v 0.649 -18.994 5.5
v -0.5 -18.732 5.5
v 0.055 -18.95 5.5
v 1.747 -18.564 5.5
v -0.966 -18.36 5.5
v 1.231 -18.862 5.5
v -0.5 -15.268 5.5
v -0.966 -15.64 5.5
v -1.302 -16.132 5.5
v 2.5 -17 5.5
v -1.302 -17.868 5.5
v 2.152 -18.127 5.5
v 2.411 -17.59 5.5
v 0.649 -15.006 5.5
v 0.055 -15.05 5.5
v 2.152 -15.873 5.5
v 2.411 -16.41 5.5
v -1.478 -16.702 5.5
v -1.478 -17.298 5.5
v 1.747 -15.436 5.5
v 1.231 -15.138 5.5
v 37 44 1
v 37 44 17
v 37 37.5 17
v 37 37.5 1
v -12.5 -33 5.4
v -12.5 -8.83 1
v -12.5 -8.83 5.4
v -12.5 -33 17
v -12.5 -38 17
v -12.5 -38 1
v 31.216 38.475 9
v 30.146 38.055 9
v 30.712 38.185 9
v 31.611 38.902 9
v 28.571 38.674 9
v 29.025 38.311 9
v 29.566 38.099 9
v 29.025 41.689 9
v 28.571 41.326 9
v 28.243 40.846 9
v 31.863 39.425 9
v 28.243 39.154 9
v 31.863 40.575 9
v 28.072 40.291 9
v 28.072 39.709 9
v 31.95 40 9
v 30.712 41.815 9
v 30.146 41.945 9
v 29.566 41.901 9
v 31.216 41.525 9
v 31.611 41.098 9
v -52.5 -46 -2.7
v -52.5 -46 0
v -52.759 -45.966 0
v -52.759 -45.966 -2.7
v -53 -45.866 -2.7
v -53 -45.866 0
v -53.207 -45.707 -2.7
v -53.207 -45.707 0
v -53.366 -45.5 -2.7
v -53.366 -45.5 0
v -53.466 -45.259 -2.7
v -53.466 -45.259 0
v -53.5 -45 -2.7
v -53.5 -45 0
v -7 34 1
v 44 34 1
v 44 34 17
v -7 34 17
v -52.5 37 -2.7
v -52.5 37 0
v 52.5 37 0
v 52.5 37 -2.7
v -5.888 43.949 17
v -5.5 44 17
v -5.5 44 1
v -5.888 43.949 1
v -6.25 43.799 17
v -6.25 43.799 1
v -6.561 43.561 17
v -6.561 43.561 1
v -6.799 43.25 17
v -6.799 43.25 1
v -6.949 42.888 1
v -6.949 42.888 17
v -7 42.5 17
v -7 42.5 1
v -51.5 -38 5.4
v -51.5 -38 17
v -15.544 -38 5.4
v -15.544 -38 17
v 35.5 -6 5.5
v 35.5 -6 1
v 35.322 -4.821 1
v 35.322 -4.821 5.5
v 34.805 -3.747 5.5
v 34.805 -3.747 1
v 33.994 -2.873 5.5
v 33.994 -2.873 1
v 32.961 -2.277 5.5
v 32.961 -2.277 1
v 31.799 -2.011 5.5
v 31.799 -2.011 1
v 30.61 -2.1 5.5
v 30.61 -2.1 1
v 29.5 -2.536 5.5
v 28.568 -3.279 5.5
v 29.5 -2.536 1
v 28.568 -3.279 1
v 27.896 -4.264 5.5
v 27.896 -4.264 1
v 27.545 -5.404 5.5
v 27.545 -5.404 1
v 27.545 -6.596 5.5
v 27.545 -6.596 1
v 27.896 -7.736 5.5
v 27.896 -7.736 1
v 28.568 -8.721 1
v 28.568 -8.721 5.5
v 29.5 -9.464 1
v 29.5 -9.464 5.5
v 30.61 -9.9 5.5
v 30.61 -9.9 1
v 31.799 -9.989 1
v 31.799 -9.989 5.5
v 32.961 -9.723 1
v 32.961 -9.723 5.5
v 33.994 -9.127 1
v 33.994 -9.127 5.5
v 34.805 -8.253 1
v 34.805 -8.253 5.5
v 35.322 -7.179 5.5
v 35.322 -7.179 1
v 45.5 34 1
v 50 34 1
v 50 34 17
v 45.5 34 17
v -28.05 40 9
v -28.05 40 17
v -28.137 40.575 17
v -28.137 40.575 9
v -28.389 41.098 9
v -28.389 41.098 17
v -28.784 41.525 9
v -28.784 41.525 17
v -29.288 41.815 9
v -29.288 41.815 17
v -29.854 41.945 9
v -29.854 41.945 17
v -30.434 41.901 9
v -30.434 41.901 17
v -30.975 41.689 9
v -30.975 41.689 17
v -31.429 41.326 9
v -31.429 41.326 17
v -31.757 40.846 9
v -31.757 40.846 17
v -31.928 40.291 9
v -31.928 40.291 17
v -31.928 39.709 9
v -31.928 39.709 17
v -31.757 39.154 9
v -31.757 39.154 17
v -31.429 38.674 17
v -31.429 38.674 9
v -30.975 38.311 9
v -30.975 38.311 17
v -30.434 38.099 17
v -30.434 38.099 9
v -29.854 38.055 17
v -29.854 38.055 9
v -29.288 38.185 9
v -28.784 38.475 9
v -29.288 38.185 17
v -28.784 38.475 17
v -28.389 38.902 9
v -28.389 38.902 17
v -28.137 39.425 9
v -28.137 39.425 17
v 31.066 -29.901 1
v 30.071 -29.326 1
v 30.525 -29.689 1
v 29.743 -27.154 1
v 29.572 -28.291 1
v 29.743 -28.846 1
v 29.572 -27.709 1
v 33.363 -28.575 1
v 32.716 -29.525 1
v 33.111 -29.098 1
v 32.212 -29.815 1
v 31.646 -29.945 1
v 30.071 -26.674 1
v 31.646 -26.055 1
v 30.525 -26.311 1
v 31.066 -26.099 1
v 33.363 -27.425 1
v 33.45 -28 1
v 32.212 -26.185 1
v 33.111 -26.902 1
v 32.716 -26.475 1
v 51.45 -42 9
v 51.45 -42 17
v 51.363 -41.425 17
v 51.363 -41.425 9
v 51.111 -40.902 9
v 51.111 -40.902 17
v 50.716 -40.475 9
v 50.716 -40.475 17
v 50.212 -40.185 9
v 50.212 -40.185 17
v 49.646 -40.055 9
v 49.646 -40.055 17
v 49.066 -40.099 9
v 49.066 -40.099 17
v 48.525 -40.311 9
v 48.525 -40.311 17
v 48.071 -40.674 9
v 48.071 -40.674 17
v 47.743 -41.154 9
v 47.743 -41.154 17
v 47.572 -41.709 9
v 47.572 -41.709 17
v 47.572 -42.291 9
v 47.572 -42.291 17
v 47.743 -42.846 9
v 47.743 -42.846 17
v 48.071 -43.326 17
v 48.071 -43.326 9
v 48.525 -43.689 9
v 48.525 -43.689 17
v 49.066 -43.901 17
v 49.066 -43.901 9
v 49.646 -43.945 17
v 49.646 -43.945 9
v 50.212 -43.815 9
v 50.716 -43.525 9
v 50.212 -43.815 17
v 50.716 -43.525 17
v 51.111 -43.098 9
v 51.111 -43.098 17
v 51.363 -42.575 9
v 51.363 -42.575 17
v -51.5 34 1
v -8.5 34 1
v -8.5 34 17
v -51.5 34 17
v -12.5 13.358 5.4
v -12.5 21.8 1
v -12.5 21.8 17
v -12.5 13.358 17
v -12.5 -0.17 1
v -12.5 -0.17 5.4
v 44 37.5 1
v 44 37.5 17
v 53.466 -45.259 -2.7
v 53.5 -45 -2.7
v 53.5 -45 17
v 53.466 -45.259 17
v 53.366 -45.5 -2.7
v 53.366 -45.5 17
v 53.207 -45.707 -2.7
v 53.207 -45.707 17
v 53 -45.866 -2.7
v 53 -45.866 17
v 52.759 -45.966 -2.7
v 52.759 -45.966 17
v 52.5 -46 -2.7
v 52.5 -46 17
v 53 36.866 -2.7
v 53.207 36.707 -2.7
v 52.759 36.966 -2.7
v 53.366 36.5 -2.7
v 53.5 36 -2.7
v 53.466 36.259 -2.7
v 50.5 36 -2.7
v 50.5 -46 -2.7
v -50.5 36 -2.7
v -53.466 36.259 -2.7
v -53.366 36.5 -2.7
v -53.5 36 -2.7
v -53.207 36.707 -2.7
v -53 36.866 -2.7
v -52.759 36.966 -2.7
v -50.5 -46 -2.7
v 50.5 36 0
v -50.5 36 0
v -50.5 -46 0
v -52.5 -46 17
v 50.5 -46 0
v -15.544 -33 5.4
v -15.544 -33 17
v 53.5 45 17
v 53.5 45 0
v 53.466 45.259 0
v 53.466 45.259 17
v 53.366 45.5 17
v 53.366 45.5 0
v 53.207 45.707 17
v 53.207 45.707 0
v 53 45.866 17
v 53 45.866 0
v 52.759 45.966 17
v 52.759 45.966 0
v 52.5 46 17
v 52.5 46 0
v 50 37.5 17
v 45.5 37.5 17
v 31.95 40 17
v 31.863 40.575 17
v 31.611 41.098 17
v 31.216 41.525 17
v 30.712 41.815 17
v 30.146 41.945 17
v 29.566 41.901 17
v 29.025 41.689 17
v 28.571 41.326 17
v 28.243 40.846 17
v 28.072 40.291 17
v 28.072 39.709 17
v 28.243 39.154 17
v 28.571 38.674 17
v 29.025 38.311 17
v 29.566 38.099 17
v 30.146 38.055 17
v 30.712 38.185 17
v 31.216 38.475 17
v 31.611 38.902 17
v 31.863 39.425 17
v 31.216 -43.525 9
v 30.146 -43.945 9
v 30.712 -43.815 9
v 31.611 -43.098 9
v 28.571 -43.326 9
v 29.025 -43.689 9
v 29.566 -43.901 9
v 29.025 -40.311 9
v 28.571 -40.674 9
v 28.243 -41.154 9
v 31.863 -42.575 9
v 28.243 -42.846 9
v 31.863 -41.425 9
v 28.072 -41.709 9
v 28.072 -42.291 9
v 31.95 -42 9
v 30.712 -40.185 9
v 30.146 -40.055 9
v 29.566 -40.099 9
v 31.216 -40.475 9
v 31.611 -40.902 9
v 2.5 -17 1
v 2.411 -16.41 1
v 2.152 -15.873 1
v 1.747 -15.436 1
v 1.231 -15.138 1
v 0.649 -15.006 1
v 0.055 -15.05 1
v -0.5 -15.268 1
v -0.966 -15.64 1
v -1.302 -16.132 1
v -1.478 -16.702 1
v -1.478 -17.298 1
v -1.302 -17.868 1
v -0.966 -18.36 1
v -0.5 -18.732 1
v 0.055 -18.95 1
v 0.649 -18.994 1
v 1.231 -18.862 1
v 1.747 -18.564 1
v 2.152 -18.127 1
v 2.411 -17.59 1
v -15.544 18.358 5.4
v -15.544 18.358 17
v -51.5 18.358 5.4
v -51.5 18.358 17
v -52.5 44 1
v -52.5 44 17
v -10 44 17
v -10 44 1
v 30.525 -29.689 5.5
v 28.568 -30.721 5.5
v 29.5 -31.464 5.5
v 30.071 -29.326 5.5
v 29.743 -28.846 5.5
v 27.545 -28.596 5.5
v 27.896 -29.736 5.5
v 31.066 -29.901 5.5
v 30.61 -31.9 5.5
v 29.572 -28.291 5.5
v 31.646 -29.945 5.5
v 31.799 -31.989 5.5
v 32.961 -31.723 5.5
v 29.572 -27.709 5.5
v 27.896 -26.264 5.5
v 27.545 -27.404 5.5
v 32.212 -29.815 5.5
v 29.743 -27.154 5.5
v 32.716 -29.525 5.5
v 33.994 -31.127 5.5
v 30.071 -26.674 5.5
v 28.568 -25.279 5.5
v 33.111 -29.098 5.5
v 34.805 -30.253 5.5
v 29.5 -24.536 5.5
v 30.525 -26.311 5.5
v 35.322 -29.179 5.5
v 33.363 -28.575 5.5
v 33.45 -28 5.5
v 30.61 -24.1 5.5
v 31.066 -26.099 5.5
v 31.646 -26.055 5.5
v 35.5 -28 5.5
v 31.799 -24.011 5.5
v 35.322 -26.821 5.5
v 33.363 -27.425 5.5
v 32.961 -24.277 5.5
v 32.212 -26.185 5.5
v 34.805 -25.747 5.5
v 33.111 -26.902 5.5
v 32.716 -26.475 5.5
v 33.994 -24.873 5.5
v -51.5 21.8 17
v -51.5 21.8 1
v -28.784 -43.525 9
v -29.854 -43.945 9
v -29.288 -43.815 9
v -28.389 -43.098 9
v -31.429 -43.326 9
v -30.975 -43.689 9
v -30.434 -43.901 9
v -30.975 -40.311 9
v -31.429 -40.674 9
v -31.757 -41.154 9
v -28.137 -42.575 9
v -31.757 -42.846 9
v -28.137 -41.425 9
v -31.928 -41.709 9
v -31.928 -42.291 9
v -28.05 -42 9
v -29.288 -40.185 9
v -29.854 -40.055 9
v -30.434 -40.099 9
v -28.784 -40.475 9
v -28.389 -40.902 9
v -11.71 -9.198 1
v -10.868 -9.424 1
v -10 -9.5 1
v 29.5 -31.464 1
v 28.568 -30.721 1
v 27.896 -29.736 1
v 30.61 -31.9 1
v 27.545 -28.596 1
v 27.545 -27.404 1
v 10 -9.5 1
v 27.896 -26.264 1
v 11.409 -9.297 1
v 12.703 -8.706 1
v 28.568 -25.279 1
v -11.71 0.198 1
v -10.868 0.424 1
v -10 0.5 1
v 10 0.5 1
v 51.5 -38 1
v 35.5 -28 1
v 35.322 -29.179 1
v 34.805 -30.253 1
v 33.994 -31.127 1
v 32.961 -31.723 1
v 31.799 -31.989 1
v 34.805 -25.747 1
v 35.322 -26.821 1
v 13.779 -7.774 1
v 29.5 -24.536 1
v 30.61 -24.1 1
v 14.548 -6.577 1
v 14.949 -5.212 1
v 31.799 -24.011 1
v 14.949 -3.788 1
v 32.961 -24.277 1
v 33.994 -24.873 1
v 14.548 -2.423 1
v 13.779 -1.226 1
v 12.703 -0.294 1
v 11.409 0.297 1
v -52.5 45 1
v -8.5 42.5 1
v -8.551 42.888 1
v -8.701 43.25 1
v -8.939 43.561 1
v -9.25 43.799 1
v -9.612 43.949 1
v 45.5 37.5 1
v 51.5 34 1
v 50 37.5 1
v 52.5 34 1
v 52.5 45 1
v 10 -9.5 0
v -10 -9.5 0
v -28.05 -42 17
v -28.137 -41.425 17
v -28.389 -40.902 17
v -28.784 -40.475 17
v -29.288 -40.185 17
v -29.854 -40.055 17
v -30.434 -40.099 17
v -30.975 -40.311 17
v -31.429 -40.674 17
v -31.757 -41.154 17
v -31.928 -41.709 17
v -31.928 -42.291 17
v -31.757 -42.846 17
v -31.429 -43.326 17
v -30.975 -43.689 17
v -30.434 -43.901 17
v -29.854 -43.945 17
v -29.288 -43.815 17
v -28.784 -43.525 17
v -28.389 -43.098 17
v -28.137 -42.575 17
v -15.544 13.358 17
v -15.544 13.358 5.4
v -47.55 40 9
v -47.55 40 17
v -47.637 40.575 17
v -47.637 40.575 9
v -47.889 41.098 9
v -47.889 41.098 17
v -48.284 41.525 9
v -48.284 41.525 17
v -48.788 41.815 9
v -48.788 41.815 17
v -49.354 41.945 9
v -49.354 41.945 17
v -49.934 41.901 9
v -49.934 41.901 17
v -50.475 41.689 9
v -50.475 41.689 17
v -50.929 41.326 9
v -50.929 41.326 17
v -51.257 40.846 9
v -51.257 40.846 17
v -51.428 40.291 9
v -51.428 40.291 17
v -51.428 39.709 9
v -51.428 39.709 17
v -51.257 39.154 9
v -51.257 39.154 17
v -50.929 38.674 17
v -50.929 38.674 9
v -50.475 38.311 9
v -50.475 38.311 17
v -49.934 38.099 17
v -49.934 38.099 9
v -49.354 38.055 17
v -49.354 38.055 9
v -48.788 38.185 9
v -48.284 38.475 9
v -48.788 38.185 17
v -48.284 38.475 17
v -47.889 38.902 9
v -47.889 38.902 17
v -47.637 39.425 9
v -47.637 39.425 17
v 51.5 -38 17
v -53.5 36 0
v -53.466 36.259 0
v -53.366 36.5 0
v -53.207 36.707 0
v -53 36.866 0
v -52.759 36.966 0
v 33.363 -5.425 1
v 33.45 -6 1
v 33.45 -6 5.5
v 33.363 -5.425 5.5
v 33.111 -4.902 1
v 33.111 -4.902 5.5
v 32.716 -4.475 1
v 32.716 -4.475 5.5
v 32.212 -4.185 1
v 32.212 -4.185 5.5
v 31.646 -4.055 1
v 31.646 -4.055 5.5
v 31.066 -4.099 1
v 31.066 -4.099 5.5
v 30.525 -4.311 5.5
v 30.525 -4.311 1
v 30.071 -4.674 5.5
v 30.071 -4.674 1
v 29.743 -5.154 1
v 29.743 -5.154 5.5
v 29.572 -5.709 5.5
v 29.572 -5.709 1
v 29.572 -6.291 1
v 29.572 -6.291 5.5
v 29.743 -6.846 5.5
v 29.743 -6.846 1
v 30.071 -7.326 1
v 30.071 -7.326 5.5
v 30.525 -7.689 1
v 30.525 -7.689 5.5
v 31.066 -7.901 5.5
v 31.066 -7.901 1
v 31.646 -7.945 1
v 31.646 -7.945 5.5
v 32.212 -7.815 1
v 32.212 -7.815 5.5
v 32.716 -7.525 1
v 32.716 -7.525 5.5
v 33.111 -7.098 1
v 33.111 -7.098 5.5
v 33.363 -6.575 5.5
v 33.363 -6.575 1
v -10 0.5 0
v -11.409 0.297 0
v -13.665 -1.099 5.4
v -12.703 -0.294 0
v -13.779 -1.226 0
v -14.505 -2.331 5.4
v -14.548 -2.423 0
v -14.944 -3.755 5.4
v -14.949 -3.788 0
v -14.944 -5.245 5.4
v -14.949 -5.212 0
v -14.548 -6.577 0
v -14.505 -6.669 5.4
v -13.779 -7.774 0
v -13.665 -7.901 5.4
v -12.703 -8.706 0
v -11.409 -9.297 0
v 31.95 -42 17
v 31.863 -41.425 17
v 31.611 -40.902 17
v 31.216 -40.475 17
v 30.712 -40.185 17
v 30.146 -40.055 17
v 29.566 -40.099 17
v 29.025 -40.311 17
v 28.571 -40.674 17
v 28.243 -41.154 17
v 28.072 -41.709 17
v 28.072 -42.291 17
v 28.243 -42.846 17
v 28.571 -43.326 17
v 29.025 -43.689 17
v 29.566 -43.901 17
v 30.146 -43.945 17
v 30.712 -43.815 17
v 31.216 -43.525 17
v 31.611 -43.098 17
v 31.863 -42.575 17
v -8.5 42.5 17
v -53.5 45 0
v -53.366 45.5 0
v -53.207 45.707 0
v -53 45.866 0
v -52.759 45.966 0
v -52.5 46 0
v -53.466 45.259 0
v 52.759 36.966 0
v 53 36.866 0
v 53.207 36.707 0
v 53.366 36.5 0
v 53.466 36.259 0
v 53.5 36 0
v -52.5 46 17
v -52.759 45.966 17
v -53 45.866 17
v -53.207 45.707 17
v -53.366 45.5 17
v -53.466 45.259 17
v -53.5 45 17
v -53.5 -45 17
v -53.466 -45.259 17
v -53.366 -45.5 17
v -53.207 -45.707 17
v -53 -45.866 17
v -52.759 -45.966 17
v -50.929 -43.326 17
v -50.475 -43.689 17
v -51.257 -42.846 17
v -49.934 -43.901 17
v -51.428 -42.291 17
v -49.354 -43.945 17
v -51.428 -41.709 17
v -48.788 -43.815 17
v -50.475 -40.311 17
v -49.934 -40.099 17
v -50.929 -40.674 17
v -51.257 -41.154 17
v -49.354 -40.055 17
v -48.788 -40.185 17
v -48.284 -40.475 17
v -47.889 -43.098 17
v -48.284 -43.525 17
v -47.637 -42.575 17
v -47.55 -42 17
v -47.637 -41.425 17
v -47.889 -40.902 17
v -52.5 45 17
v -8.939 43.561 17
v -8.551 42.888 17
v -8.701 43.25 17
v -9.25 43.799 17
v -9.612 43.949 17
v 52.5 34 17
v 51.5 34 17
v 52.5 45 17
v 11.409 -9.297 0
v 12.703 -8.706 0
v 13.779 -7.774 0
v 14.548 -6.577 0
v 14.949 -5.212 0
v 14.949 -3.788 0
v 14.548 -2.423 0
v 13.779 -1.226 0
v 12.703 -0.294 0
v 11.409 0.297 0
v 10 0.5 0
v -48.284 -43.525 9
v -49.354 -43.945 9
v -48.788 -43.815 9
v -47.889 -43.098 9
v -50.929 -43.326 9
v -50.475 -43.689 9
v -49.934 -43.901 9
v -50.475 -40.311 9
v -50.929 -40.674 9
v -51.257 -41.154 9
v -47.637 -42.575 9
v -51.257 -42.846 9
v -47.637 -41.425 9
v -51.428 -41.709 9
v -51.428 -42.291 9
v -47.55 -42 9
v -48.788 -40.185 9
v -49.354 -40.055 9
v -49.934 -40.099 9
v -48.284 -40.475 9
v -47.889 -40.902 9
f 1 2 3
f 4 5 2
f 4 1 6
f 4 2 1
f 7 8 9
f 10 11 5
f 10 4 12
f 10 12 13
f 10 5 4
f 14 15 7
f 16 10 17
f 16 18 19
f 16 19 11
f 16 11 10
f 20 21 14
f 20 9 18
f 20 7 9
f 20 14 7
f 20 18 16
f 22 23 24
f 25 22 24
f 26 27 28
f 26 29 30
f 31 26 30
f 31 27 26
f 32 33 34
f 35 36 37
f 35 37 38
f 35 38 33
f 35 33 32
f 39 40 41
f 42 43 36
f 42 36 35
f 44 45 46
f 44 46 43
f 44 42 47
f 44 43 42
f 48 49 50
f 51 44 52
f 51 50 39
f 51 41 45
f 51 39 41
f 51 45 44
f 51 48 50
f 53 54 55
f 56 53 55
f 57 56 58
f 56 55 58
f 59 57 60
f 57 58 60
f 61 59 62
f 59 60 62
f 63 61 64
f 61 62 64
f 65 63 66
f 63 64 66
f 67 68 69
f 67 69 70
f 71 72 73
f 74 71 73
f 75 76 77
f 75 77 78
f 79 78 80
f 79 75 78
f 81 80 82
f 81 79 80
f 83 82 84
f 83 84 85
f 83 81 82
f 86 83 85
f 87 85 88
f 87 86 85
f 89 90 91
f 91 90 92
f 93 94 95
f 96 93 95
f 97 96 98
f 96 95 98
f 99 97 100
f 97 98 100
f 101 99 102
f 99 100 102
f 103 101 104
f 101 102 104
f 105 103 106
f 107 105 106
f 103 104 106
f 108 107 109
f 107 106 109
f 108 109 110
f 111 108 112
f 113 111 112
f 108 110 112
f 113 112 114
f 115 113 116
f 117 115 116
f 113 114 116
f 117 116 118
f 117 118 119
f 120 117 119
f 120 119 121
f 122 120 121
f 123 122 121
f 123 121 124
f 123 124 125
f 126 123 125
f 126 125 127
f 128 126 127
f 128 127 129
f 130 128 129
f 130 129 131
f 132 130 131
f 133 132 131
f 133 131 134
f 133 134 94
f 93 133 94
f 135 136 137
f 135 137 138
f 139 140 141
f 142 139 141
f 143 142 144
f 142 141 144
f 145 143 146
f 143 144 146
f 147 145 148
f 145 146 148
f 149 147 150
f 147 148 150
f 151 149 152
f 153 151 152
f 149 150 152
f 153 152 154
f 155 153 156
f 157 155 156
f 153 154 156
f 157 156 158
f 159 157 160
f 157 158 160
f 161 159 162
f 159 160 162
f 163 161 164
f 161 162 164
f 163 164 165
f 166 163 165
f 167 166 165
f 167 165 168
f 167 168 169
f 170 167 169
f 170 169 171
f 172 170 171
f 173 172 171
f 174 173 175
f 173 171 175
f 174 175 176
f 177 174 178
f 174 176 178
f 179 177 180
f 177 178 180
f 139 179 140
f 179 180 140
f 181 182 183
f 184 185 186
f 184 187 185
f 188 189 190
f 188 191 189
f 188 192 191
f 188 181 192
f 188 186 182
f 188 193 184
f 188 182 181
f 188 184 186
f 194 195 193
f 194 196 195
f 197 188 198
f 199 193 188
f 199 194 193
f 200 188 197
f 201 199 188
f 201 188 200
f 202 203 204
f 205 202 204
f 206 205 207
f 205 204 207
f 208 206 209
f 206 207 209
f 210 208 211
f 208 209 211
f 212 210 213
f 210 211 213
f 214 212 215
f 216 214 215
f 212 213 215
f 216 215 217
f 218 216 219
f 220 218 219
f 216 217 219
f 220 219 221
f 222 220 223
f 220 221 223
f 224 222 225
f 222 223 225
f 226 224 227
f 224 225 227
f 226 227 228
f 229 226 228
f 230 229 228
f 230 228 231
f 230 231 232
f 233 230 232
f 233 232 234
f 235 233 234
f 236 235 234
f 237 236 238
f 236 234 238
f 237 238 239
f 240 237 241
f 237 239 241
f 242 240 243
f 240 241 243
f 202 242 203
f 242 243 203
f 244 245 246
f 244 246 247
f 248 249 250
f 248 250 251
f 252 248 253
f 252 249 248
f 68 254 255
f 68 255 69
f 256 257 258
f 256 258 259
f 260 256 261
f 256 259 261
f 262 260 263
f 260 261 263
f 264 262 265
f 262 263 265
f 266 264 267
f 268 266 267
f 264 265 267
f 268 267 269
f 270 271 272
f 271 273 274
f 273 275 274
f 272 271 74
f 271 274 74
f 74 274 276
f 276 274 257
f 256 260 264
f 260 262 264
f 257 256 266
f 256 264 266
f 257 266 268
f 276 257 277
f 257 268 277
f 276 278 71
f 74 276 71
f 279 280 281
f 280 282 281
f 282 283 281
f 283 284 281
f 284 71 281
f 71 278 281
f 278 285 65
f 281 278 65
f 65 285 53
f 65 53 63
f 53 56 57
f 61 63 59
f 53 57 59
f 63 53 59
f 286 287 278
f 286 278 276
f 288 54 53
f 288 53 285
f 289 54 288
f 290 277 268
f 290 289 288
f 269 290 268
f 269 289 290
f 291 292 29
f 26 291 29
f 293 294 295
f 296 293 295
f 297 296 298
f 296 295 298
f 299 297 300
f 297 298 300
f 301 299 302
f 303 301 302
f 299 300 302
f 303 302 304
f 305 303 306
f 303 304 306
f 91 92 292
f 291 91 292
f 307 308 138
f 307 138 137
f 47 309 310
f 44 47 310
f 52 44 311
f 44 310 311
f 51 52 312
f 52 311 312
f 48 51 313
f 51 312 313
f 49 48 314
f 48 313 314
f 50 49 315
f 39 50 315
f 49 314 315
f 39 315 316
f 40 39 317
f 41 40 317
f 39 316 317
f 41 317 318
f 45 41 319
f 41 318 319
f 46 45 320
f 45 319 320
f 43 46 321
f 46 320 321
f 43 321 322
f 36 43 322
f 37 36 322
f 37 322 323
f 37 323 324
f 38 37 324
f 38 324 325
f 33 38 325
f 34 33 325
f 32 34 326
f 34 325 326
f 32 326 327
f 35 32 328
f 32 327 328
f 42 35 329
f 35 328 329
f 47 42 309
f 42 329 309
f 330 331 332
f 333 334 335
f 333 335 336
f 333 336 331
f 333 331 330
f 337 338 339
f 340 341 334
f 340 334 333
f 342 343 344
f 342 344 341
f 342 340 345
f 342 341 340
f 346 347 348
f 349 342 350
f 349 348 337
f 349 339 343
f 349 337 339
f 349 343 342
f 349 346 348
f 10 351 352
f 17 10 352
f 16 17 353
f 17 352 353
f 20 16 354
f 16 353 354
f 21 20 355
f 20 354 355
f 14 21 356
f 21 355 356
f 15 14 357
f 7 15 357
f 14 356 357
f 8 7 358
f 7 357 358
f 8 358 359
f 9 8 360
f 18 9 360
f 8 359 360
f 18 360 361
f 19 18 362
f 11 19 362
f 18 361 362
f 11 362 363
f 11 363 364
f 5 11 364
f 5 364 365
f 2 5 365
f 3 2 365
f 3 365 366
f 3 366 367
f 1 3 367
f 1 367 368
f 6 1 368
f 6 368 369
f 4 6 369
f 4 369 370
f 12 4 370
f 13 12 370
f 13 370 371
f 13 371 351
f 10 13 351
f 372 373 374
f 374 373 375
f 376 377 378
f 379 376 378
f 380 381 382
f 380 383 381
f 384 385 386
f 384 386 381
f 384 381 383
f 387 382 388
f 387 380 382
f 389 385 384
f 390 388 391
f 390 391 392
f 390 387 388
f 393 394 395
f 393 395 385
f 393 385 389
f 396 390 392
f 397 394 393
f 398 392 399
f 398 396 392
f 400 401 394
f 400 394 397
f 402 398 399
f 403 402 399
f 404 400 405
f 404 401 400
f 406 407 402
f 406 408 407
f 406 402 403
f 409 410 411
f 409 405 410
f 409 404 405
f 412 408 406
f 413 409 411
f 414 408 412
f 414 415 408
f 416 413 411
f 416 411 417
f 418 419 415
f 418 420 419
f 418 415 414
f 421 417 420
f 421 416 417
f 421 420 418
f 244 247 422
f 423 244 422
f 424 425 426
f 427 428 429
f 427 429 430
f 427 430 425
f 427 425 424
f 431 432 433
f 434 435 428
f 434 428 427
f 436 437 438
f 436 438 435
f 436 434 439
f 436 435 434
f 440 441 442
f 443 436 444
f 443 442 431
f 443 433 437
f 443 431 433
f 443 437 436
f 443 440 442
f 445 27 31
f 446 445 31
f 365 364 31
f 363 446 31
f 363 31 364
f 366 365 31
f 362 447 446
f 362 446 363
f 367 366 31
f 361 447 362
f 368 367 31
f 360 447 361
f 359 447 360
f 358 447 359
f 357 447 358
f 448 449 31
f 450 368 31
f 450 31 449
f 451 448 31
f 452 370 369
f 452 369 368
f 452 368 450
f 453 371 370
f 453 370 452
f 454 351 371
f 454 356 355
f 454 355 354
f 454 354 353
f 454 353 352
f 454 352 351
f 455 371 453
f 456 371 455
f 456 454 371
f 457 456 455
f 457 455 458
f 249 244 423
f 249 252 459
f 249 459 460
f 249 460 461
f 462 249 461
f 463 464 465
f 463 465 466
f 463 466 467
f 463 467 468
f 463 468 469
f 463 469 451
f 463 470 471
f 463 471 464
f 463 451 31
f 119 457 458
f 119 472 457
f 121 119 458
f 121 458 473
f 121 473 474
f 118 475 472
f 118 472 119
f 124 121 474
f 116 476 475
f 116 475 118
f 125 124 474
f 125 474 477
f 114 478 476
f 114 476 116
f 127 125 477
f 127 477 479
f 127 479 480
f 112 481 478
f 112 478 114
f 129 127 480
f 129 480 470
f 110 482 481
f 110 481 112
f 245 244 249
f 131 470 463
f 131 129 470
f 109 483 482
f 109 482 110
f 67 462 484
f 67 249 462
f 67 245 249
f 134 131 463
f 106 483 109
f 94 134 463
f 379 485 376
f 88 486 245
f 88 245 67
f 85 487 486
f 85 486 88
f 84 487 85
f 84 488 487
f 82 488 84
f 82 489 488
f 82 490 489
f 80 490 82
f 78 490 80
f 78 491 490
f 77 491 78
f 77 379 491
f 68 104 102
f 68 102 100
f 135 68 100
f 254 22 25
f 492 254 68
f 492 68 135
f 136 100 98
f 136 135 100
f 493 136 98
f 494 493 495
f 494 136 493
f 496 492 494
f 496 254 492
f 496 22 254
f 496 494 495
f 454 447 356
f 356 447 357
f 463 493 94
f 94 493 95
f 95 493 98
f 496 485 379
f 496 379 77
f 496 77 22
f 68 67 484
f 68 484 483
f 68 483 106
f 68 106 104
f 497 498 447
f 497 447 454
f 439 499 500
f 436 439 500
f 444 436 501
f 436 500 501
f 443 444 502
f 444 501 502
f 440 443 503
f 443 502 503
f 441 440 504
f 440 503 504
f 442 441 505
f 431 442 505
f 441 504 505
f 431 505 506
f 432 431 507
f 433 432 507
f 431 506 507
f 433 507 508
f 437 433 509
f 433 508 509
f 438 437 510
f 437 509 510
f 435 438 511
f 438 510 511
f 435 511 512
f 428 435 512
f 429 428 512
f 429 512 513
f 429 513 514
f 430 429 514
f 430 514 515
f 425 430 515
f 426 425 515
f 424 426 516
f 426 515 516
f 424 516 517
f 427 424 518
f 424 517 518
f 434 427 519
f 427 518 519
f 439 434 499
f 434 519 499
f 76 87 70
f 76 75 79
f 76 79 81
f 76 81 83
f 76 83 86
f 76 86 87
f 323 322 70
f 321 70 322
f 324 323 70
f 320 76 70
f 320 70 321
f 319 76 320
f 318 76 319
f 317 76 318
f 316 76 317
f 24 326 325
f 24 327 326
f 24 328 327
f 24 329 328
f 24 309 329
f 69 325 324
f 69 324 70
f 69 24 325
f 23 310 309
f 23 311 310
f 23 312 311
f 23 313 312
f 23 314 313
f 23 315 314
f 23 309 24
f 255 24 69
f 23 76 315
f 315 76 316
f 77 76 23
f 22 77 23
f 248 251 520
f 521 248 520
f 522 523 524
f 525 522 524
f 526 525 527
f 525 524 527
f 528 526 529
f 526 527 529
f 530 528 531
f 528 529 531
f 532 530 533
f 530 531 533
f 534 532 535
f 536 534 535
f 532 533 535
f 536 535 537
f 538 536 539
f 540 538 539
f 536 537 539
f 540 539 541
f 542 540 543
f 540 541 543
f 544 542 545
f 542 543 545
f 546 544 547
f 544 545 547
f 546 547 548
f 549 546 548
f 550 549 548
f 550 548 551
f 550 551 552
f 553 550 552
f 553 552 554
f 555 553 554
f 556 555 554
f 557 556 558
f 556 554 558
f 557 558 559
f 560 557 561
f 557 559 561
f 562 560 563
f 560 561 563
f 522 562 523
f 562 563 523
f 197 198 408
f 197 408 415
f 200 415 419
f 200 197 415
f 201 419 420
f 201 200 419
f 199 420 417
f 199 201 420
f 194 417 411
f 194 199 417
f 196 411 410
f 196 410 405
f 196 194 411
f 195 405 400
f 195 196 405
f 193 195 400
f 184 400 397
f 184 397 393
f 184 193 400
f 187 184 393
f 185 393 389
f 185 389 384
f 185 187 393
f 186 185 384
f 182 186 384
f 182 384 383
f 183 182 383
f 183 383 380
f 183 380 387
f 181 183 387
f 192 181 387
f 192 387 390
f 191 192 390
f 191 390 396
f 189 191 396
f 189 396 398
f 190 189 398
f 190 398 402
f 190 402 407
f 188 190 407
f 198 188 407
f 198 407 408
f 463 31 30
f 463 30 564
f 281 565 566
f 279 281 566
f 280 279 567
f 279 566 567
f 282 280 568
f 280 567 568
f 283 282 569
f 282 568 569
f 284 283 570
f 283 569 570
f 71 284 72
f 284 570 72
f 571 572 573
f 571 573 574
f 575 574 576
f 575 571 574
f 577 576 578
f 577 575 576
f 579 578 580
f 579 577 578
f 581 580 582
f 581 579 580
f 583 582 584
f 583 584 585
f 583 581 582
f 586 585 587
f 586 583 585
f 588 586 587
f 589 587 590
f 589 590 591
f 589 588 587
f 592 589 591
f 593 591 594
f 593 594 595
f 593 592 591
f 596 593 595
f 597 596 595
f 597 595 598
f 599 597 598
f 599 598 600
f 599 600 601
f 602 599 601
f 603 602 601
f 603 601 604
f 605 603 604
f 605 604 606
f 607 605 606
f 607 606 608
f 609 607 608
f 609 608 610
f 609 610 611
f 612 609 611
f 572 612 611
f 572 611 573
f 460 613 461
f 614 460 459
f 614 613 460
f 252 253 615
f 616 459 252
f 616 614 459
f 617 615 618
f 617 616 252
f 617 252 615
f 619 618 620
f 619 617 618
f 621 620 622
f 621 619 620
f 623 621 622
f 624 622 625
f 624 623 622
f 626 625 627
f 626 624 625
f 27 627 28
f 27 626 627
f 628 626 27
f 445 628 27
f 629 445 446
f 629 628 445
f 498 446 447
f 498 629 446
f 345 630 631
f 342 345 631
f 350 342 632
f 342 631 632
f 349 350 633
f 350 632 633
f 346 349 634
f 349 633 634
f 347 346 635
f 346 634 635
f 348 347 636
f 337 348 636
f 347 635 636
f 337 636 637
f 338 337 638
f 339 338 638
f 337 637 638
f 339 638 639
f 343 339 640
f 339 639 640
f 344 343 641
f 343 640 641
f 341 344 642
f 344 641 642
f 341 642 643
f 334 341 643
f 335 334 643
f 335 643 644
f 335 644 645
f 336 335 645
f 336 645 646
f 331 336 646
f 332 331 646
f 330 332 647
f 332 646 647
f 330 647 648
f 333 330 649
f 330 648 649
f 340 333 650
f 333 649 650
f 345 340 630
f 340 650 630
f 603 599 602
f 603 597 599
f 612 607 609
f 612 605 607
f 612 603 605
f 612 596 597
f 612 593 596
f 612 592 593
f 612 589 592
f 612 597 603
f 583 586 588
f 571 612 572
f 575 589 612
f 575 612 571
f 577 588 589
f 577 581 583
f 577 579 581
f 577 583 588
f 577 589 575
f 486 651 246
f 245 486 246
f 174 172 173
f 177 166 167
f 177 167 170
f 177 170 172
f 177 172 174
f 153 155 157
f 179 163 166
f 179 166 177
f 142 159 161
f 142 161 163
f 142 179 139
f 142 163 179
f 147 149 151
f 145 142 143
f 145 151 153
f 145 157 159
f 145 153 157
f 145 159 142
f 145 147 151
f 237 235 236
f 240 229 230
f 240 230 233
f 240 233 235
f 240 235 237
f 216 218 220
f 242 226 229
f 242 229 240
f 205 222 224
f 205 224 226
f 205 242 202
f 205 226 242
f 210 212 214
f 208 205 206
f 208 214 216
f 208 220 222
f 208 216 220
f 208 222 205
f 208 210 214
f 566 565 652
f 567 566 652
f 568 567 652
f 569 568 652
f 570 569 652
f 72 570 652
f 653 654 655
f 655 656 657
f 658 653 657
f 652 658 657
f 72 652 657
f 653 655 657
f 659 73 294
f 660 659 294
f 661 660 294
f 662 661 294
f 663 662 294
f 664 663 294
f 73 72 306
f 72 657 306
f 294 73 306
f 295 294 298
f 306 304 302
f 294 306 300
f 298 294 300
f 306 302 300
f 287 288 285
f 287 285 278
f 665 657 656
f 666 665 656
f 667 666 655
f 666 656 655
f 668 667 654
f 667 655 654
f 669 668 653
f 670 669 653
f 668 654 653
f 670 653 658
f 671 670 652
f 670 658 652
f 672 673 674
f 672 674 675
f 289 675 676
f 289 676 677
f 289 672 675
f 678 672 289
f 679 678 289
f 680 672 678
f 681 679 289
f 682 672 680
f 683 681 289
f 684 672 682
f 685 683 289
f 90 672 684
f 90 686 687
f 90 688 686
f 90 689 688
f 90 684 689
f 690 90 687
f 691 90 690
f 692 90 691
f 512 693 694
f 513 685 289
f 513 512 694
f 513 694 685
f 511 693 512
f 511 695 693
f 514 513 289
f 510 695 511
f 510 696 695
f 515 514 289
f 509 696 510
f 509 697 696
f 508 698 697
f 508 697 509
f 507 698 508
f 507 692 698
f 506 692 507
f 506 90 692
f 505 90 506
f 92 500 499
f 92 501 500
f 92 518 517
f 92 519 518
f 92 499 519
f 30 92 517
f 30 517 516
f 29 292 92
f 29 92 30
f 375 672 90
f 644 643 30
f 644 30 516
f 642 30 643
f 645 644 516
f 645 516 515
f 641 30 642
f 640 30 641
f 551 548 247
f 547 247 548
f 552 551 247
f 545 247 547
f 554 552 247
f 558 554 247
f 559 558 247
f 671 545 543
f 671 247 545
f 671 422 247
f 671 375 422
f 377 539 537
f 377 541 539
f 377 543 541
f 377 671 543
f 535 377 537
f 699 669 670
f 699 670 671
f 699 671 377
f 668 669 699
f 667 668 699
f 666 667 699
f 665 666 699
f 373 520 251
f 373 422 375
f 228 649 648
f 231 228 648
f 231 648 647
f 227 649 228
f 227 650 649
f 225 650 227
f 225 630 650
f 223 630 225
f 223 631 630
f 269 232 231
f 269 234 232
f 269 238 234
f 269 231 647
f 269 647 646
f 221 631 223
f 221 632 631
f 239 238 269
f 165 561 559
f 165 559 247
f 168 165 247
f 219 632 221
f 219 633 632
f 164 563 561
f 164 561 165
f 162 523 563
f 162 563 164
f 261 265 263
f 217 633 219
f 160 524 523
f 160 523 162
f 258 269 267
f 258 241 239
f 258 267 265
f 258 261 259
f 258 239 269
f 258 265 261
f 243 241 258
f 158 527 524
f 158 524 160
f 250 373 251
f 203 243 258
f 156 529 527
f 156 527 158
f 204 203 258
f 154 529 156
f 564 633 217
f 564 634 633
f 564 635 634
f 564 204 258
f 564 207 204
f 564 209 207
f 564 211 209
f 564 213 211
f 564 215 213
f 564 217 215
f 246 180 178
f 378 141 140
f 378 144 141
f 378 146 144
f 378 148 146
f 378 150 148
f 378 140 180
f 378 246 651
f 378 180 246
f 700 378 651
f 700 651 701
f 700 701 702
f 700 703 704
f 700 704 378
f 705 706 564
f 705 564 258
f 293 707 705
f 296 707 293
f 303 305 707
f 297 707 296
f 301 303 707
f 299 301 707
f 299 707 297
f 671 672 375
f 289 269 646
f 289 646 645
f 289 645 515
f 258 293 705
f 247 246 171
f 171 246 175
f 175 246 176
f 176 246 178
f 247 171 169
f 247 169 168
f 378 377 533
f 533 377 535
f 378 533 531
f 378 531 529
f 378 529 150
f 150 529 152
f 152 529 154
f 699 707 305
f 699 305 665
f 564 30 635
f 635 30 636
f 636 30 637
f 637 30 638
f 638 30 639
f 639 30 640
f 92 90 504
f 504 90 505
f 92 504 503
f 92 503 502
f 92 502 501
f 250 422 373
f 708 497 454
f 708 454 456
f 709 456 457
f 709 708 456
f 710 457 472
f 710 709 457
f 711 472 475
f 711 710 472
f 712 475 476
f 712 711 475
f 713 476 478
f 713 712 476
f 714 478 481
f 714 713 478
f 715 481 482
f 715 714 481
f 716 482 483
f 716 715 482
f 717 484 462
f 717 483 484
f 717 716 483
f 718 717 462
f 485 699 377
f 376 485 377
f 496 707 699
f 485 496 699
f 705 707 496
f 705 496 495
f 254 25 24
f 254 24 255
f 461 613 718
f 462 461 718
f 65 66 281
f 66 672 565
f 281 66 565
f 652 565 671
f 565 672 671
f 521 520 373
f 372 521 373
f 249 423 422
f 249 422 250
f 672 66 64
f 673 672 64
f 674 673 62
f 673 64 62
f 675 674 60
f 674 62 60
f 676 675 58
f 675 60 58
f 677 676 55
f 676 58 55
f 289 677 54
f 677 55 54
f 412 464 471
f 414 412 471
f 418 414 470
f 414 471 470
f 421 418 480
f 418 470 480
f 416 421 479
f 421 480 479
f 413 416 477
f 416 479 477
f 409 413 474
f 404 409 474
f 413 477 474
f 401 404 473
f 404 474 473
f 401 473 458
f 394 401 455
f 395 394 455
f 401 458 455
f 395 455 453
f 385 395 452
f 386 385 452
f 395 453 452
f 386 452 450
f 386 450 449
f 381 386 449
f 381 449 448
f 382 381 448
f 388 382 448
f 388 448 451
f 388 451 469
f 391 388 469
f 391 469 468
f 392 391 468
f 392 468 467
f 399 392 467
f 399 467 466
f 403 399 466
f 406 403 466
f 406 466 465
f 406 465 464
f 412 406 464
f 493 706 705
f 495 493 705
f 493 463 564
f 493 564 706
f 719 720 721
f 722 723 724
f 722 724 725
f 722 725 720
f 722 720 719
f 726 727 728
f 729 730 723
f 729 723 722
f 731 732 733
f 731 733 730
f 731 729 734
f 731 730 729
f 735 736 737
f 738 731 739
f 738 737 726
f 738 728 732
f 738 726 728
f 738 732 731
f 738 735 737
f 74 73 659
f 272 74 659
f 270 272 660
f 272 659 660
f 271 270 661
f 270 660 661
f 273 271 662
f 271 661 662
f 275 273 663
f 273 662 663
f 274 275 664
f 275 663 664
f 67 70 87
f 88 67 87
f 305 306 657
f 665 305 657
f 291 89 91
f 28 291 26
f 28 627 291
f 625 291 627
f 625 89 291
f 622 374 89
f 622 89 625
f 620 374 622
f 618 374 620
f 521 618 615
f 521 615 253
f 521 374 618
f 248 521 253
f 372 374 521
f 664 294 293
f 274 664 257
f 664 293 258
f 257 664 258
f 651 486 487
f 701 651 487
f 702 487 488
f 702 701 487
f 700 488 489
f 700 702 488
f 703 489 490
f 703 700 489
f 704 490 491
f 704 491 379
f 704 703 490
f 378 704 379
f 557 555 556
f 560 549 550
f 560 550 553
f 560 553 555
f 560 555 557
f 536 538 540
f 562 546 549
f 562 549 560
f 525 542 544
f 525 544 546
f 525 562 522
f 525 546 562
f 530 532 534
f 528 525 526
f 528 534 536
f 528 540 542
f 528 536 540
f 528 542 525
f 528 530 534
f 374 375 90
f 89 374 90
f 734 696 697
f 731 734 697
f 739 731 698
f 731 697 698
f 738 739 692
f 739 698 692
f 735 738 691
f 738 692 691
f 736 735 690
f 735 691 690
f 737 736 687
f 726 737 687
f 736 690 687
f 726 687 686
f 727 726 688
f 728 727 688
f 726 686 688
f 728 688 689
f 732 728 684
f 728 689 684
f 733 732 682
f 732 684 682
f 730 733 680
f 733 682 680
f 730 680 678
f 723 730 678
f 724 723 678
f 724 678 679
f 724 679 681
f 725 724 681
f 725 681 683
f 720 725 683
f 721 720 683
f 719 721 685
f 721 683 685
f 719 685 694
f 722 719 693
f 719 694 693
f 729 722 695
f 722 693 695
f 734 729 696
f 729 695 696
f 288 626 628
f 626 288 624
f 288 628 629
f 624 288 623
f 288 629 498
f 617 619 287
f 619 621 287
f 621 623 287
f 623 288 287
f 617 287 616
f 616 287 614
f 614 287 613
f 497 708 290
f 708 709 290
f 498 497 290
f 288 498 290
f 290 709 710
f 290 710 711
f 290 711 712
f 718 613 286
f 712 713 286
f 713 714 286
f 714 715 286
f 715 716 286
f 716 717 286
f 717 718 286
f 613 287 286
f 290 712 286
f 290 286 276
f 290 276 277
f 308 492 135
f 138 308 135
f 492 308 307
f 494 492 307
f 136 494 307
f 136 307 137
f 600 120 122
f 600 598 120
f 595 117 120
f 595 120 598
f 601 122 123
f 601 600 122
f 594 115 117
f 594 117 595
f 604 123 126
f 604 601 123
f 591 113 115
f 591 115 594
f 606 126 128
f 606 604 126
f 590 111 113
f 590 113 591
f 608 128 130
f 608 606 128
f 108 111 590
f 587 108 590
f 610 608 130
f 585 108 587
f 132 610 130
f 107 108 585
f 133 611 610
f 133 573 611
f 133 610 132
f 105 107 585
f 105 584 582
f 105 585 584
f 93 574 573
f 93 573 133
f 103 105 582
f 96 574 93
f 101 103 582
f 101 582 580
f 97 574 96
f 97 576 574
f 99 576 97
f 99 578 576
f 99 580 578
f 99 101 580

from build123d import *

# Parameters (mm, degrees)
PAD011_DEPTH    = 1
PAD012_DEPTH    = 17
POCKET008_DEPTH = 16
POCKET009_DEPTH = 11.6
SKETCH023_R     = 4
SKETCH023_R_2   = 1.95
SKETCH023_R_3   = 2
PAD013_DEPTH    = 5.5
SKETCH024_R     = 1.95
POCKET010_DEPTH = 8
PAD017_DEPTH    = 2.7
POCKET013_DEPTH = 17


with BuildPart() as part:
    # Sketch019 → Pad011 (new body)
    with BuildSketch(Plane.XY):
        with BuildLine():
            Line((-53.5, 45), (-53.5, -45))
            ThreePointArc((-53.5, -45), (-53.207107, -45.707107), (-52.5, -46))
            Line((-52.5, -46), (52.5, -46))
            ThreePointArc((52.5, -46), (53.207107, -45.707107), (53.5, -45))
            Line((53.5, -45), (53.5, 45))
            ThreePointArc((53.5, 45), (53.207107, 45.707107), (52.5, 46))
            Line((52.5, 46), (-52.5, 46))
            ThreePointArc((-52.5, 46), (-53.207107, 45.707107), (-53.5, 45))
        make_face()
    extrude(amount=PAD011_DEPTH)

    # Sketch020 → Pad012 (join)
    with BuildSketch(Plane.XY):
        with BuildLine():
            Line((-53.5, 45), (-53.5, -45))
            ThreePointArc((-53.5, -45), (-53.207107, -45.707107), (-52.5, -46))
            Line((-52.5, -46), (52.5, -46))
            ThreePointArc((52.5, -46), (53.207107, -45.707107), (53.5, -45))
            Line((53.5, -45), (53.5, 45))
            ThreePointArc((53.5, 45), (53.207107, 45.707107), (52.5, 46))
            Line((52.5, 46), (-52.5, 46))
            ThreePointArc((-52.5, 46), (-53.207107, 45.707107), (-53.5, 45))
        make_face()
        Polygon((-51.5, 34), (-51.5, 21.8), (-12.5, 21.8), (-12.5, -38), (51.5, -38), (51.5, 34), align=None, mode=Mode.SUBTRACT)
    extrude(amount=PAD012_DEPTH)

    # Sketch021 (on Face14 of Pad012) → Pocket008 (cut)
    with BuildSketch(Plane.XY.offset(17)):
        with BuildLine():
            Line((-52.5, 45), (-52.5, 44))
            Line((-52.5, 44), (-10, 44))
            ThreePointArc((-8.5, 42.5), (-8.93934, 43.56066), (-10, 44))
            Line((-8.5, 42.5), (-8.5, 34))
            Line((-8.5, 34), (-7, 34))
            Line((-7, 34), (-7, 42.5))
            ThreePointArc((-5.5, 44), (-6.56066, 43.56066), (-7, 42.5))
            Line((-5.5, 44), (37, 44))
            Line((37, 44), (37, 37.5))
            Line((37, 37.5), (44, 37.5))
            Line((44, 37.5), (44, 34))
            Line((45.5, 34), (44, 34))
            Line((45.5, 37.5), (45.5, 34))
            Line((45.5, 37.5), (50, 37.5))
            Line((50, 37.5), (50, 34))
            Line((50, 34), (52.5, 34))
            Line((52.5, 45), (52.5, 34))
            Line((52.5, 45), (-52.5, 45))
        make_face()
    extrude(amount=-POCKET008_DEPTH, mode=Mode.SUBTRACT)

    # Sketch022 (on Face14 of Pocket008) → Pocket009 (cut)
    with BuildSketch(Plane.XY.offset(17)):
        Polygon((-15.544, 18.358), (-51.5, 18.358), (-51.5, -38), (-15.544, -38), (-15.544, -33), (-12.5, -33), (-12.5, 13.358), (-15.544, 13.358), align=None)
    extrude(amount=-POCKET009_DEPTH, mode=Mode.SUBTRACT)

    # Sketch023 → Pad013 (join)
    with BuildSketch(Plane.XY):
        with Locations((31.5, -6)):
            Circle(SKETCH023_R)
        with Locations((31.5, -6)):
            Circle(SKETCH023_R_2, mode=Mode.SUBTRACT)
        with Locations((31.5, -28)):
            Circle(SKETCH023_R)
        with Locations((31.5, -28)):
            Circle(SKETCH023_R_2, mode=Mode.SUBTRACT)
        with Locations((0.5, -17)):
            Circle(SKETCH023_R_3)
    extrude(amount=PAD013_DEPTH)

    # Sketch024 (on Face14 of Pad013) → Pocket010 (cut)
    with BuildSketch(Plane.XY.offset(17)):
        with Locations((-49.5, -42)):
            Circle(SKETCH024_R)
        with Locations((-30, -42)):
            Circle(SKETCH024_R)
        with Locations((30, -42)):
            Circle(SKETCH024_R)
        with Locations((-49.5, 40)):
            Circle(SKETCH024_R)
        with Locations((-30, 40)):
            Circle(SKETCH024_R)
        with Locations((30, 40)):
            Circle(SKETCH024_R)
        with Locations((49.5, -42)):
            Circle(SKETCH024_R)
    extrude(amount=-POCKET010_DEPTH, mode=Mode.SUBTRACT)

    # Sketch025 (on Face4 of Pocket010) → Pad017 (join)
    with BuildSketch(Plane(origin=(0, 0, 0), x_dir=(1, 0, 0), z_dir=(0, 0, -1))):
        with BuildLine():
            Line((-50.500005, -36), (50.499995, -36))
            Line((50.499995, -36), (50.499995, 46))
            Line((52.5, 46), (50.499995, 46))
            ThreePointArc((53.5, 45), (53.207107, 45.707107), (52.5, 46))
            Line((53.5, -36), (53.5, 45))
            ThreePointArc((52.5, -37), (53.207107, -36.707107), (53.5, -36))
            Line((-52.5, -37), (52.5, -37))
            ThreePointArc((-53.5, -36), (-53.207107, -36.707107), (-52.5, -37))
            Line((-53.5, 45), (-53.5, -36))
            ThreePointArc((-52.500009, 46), (-53.20711, 45.707104), (-53.5, 45))
            Line((-52.500009, 46), (-50.500005, 46))
            Line((-50.500005, 46), (-50.500005, -36))
        make_face()
    extrude(amount=PAD017_DEPTH)

    # Sketch026 → Pocket013 (cut)
    with BuildSketch(Plane.XY):
        with BuildLine():
            ThreePointArc((-10, 0.5), (-15, -4.5), (-10, -9.5))
            Line((-10, -9.5), (10, -9.5))
            ThreePointArc((10, -9.5), (15, -4.5), (10, 0.5))
            Line((-10, 0.5), (10, 0.5))
        make_face()
    extrude(amount=POCKET013_DEPTH, mode=Mode.SUBTRACT)


solid = part.part
